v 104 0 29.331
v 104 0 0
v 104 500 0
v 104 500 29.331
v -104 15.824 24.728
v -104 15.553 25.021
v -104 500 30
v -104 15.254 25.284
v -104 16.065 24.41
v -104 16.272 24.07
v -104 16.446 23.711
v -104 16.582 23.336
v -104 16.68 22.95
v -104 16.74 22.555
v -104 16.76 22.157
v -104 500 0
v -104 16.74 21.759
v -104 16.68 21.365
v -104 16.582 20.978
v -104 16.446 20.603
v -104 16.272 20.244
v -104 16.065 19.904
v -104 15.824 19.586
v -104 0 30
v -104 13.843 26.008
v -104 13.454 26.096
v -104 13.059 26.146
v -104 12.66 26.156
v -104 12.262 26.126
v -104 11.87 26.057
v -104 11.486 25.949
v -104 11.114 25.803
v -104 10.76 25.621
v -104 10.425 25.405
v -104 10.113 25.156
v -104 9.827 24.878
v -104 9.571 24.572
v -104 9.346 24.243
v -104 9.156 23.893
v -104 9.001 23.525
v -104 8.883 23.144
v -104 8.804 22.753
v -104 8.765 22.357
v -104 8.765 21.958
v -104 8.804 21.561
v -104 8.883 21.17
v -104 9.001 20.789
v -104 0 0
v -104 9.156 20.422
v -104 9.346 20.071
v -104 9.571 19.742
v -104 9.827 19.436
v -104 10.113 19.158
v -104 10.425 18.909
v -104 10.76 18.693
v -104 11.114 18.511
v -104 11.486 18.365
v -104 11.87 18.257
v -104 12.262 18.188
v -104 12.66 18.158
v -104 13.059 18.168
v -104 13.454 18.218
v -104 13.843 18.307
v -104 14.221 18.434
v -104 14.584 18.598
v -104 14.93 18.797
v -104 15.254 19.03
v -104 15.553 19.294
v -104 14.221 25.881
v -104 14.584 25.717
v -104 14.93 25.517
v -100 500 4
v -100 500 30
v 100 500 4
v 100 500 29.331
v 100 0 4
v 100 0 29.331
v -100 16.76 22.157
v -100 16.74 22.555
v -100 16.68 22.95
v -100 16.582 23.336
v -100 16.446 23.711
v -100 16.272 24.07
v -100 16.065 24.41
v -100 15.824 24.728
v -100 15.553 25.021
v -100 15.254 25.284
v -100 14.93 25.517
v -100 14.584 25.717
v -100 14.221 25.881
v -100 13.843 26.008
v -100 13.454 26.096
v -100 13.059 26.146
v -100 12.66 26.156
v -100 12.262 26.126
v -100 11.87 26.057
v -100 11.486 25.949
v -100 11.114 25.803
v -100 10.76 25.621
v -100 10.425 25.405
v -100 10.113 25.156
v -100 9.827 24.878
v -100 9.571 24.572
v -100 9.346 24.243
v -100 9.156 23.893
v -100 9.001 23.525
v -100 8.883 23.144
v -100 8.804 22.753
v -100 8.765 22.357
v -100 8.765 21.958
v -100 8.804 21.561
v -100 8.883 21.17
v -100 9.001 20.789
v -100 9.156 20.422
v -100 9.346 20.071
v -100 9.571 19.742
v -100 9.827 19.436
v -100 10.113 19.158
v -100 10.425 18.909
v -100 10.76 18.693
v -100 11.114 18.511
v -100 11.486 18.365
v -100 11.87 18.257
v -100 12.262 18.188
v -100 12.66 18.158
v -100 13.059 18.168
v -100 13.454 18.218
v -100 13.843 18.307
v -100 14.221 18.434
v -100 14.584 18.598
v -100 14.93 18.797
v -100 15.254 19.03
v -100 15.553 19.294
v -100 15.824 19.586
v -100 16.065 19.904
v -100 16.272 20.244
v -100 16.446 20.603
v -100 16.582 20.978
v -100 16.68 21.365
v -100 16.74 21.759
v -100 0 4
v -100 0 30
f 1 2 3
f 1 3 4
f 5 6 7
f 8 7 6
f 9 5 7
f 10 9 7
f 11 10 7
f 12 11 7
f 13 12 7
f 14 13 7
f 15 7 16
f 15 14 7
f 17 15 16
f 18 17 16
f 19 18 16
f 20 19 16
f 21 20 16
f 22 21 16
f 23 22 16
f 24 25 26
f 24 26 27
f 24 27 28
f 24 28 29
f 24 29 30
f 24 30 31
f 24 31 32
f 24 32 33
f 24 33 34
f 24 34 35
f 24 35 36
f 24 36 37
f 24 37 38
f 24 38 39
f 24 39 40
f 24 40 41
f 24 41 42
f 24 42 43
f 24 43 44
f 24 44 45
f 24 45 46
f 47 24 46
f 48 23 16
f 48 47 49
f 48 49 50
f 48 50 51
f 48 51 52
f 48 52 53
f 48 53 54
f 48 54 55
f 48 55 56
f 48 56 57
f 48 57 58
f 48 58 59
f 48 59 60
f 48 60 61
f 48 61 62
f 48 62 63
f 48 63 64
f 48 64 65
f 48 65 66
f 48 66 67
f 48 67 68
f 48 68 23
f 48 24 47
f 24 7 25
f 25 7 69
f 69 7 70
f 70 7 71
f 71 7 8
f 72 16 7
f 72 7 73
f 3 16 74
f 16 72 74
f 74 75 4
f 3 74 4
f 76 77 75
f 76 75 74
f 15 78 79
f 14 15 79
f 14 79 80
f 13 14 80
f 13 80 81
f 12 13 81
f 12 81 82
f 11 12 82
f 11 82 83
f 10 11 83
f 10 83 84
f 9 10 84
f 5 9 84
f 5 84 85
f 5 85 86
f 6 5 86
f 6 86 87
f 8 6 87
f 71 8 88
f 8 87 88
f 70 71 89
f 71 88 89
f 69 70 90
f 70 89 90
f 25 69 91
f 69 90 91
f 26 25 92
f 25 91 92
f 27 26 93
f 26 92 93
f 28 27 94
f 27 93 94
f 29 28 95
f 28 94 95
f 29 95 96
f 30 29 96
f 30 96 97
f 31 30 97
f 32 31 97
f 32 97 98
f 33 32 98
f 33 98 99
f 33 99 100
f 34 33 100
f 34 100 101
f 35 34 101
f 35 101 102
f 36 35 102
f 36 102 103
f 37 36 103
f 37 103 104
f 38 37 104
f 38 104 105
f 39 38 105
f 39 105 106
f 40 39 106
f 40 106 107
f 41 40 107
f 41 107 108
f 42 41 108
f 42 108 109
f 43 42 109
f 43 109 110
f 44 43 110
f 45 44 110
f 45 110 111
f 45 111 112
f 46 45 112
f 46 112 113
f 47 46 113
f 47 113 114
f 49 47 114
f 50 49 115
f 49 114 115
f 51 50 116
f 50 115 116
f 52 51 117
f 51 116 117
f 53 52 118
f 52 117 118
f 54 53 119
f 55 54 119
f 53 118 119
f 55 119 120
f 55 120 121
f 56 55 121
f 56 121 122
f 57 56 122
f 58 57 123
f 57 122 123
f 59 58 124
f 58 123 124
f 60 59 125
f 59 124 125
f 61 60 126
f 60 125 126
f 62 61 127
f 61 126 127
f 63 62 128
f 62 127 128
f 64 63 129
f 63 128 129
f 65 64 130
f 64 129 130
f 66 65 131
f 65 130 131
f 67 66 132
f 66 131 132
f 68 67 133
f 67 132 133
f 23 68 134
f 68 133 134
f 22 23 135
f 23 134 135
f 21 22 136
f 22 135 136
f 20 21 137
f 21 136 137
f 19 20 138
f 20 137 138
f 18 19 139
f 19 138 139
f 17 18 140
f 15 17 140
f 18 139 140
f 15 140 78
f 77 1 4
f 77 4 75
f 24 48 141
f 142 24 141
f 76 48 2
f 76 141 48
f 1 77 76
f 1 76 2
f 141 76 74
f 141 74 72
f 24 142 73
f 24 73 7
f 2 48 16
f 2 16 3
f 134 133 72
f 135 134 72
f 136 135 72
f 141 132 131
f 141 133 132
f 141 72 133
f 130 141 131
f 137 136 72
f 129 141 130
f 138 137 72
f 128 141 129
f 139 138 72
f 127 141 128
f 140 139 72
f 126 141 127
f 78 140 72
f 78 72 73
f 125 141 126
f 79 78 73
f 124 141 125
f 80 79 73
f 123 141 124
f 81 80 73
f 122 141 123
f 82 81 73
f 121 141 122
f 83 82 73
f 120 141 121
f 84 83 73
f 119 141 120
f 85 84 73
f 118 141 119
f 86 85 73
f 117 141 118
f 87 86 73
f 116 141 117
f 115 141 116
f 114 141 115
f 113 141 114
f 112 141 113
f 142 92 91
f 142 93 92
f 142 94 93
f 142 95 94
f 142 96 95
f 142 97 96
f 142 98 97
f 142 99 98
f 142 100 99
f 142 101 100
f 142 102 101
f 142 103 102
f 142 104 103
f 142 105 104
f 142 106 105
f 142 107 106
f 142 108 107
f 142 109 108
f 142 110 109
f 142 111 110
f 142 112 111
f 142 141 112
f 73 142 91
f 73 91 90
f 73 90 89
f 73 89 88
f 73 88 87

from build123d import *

# Parameters (mm, degrees)
F1_DEPTH = 500
F3_D     = 8
F3_DEPTH = 12


with BuildPart() as f1:
    # F0 (on Front) → F1 (new body)
    with BuildSketch(Plane.XZ):
        Polygon((-104, 30), (-104, 0), (104, 0), (104, 29.331477), (100, 29.331477), (100, 4), (-100, 4), (-100, 30), align=None)
    extrude(amount=-F1_DEPTH)

    # F3
    with Locations(Plane(origin=(-104, 0, 0), x_dir=(0, -1, 0), z_dir=(-1, 0, 0))):
        with Locations((-12.759611, 22.157129)):
            Hole(F3_D / 2, depth=F3_DEPTH)


solid = f1.part
